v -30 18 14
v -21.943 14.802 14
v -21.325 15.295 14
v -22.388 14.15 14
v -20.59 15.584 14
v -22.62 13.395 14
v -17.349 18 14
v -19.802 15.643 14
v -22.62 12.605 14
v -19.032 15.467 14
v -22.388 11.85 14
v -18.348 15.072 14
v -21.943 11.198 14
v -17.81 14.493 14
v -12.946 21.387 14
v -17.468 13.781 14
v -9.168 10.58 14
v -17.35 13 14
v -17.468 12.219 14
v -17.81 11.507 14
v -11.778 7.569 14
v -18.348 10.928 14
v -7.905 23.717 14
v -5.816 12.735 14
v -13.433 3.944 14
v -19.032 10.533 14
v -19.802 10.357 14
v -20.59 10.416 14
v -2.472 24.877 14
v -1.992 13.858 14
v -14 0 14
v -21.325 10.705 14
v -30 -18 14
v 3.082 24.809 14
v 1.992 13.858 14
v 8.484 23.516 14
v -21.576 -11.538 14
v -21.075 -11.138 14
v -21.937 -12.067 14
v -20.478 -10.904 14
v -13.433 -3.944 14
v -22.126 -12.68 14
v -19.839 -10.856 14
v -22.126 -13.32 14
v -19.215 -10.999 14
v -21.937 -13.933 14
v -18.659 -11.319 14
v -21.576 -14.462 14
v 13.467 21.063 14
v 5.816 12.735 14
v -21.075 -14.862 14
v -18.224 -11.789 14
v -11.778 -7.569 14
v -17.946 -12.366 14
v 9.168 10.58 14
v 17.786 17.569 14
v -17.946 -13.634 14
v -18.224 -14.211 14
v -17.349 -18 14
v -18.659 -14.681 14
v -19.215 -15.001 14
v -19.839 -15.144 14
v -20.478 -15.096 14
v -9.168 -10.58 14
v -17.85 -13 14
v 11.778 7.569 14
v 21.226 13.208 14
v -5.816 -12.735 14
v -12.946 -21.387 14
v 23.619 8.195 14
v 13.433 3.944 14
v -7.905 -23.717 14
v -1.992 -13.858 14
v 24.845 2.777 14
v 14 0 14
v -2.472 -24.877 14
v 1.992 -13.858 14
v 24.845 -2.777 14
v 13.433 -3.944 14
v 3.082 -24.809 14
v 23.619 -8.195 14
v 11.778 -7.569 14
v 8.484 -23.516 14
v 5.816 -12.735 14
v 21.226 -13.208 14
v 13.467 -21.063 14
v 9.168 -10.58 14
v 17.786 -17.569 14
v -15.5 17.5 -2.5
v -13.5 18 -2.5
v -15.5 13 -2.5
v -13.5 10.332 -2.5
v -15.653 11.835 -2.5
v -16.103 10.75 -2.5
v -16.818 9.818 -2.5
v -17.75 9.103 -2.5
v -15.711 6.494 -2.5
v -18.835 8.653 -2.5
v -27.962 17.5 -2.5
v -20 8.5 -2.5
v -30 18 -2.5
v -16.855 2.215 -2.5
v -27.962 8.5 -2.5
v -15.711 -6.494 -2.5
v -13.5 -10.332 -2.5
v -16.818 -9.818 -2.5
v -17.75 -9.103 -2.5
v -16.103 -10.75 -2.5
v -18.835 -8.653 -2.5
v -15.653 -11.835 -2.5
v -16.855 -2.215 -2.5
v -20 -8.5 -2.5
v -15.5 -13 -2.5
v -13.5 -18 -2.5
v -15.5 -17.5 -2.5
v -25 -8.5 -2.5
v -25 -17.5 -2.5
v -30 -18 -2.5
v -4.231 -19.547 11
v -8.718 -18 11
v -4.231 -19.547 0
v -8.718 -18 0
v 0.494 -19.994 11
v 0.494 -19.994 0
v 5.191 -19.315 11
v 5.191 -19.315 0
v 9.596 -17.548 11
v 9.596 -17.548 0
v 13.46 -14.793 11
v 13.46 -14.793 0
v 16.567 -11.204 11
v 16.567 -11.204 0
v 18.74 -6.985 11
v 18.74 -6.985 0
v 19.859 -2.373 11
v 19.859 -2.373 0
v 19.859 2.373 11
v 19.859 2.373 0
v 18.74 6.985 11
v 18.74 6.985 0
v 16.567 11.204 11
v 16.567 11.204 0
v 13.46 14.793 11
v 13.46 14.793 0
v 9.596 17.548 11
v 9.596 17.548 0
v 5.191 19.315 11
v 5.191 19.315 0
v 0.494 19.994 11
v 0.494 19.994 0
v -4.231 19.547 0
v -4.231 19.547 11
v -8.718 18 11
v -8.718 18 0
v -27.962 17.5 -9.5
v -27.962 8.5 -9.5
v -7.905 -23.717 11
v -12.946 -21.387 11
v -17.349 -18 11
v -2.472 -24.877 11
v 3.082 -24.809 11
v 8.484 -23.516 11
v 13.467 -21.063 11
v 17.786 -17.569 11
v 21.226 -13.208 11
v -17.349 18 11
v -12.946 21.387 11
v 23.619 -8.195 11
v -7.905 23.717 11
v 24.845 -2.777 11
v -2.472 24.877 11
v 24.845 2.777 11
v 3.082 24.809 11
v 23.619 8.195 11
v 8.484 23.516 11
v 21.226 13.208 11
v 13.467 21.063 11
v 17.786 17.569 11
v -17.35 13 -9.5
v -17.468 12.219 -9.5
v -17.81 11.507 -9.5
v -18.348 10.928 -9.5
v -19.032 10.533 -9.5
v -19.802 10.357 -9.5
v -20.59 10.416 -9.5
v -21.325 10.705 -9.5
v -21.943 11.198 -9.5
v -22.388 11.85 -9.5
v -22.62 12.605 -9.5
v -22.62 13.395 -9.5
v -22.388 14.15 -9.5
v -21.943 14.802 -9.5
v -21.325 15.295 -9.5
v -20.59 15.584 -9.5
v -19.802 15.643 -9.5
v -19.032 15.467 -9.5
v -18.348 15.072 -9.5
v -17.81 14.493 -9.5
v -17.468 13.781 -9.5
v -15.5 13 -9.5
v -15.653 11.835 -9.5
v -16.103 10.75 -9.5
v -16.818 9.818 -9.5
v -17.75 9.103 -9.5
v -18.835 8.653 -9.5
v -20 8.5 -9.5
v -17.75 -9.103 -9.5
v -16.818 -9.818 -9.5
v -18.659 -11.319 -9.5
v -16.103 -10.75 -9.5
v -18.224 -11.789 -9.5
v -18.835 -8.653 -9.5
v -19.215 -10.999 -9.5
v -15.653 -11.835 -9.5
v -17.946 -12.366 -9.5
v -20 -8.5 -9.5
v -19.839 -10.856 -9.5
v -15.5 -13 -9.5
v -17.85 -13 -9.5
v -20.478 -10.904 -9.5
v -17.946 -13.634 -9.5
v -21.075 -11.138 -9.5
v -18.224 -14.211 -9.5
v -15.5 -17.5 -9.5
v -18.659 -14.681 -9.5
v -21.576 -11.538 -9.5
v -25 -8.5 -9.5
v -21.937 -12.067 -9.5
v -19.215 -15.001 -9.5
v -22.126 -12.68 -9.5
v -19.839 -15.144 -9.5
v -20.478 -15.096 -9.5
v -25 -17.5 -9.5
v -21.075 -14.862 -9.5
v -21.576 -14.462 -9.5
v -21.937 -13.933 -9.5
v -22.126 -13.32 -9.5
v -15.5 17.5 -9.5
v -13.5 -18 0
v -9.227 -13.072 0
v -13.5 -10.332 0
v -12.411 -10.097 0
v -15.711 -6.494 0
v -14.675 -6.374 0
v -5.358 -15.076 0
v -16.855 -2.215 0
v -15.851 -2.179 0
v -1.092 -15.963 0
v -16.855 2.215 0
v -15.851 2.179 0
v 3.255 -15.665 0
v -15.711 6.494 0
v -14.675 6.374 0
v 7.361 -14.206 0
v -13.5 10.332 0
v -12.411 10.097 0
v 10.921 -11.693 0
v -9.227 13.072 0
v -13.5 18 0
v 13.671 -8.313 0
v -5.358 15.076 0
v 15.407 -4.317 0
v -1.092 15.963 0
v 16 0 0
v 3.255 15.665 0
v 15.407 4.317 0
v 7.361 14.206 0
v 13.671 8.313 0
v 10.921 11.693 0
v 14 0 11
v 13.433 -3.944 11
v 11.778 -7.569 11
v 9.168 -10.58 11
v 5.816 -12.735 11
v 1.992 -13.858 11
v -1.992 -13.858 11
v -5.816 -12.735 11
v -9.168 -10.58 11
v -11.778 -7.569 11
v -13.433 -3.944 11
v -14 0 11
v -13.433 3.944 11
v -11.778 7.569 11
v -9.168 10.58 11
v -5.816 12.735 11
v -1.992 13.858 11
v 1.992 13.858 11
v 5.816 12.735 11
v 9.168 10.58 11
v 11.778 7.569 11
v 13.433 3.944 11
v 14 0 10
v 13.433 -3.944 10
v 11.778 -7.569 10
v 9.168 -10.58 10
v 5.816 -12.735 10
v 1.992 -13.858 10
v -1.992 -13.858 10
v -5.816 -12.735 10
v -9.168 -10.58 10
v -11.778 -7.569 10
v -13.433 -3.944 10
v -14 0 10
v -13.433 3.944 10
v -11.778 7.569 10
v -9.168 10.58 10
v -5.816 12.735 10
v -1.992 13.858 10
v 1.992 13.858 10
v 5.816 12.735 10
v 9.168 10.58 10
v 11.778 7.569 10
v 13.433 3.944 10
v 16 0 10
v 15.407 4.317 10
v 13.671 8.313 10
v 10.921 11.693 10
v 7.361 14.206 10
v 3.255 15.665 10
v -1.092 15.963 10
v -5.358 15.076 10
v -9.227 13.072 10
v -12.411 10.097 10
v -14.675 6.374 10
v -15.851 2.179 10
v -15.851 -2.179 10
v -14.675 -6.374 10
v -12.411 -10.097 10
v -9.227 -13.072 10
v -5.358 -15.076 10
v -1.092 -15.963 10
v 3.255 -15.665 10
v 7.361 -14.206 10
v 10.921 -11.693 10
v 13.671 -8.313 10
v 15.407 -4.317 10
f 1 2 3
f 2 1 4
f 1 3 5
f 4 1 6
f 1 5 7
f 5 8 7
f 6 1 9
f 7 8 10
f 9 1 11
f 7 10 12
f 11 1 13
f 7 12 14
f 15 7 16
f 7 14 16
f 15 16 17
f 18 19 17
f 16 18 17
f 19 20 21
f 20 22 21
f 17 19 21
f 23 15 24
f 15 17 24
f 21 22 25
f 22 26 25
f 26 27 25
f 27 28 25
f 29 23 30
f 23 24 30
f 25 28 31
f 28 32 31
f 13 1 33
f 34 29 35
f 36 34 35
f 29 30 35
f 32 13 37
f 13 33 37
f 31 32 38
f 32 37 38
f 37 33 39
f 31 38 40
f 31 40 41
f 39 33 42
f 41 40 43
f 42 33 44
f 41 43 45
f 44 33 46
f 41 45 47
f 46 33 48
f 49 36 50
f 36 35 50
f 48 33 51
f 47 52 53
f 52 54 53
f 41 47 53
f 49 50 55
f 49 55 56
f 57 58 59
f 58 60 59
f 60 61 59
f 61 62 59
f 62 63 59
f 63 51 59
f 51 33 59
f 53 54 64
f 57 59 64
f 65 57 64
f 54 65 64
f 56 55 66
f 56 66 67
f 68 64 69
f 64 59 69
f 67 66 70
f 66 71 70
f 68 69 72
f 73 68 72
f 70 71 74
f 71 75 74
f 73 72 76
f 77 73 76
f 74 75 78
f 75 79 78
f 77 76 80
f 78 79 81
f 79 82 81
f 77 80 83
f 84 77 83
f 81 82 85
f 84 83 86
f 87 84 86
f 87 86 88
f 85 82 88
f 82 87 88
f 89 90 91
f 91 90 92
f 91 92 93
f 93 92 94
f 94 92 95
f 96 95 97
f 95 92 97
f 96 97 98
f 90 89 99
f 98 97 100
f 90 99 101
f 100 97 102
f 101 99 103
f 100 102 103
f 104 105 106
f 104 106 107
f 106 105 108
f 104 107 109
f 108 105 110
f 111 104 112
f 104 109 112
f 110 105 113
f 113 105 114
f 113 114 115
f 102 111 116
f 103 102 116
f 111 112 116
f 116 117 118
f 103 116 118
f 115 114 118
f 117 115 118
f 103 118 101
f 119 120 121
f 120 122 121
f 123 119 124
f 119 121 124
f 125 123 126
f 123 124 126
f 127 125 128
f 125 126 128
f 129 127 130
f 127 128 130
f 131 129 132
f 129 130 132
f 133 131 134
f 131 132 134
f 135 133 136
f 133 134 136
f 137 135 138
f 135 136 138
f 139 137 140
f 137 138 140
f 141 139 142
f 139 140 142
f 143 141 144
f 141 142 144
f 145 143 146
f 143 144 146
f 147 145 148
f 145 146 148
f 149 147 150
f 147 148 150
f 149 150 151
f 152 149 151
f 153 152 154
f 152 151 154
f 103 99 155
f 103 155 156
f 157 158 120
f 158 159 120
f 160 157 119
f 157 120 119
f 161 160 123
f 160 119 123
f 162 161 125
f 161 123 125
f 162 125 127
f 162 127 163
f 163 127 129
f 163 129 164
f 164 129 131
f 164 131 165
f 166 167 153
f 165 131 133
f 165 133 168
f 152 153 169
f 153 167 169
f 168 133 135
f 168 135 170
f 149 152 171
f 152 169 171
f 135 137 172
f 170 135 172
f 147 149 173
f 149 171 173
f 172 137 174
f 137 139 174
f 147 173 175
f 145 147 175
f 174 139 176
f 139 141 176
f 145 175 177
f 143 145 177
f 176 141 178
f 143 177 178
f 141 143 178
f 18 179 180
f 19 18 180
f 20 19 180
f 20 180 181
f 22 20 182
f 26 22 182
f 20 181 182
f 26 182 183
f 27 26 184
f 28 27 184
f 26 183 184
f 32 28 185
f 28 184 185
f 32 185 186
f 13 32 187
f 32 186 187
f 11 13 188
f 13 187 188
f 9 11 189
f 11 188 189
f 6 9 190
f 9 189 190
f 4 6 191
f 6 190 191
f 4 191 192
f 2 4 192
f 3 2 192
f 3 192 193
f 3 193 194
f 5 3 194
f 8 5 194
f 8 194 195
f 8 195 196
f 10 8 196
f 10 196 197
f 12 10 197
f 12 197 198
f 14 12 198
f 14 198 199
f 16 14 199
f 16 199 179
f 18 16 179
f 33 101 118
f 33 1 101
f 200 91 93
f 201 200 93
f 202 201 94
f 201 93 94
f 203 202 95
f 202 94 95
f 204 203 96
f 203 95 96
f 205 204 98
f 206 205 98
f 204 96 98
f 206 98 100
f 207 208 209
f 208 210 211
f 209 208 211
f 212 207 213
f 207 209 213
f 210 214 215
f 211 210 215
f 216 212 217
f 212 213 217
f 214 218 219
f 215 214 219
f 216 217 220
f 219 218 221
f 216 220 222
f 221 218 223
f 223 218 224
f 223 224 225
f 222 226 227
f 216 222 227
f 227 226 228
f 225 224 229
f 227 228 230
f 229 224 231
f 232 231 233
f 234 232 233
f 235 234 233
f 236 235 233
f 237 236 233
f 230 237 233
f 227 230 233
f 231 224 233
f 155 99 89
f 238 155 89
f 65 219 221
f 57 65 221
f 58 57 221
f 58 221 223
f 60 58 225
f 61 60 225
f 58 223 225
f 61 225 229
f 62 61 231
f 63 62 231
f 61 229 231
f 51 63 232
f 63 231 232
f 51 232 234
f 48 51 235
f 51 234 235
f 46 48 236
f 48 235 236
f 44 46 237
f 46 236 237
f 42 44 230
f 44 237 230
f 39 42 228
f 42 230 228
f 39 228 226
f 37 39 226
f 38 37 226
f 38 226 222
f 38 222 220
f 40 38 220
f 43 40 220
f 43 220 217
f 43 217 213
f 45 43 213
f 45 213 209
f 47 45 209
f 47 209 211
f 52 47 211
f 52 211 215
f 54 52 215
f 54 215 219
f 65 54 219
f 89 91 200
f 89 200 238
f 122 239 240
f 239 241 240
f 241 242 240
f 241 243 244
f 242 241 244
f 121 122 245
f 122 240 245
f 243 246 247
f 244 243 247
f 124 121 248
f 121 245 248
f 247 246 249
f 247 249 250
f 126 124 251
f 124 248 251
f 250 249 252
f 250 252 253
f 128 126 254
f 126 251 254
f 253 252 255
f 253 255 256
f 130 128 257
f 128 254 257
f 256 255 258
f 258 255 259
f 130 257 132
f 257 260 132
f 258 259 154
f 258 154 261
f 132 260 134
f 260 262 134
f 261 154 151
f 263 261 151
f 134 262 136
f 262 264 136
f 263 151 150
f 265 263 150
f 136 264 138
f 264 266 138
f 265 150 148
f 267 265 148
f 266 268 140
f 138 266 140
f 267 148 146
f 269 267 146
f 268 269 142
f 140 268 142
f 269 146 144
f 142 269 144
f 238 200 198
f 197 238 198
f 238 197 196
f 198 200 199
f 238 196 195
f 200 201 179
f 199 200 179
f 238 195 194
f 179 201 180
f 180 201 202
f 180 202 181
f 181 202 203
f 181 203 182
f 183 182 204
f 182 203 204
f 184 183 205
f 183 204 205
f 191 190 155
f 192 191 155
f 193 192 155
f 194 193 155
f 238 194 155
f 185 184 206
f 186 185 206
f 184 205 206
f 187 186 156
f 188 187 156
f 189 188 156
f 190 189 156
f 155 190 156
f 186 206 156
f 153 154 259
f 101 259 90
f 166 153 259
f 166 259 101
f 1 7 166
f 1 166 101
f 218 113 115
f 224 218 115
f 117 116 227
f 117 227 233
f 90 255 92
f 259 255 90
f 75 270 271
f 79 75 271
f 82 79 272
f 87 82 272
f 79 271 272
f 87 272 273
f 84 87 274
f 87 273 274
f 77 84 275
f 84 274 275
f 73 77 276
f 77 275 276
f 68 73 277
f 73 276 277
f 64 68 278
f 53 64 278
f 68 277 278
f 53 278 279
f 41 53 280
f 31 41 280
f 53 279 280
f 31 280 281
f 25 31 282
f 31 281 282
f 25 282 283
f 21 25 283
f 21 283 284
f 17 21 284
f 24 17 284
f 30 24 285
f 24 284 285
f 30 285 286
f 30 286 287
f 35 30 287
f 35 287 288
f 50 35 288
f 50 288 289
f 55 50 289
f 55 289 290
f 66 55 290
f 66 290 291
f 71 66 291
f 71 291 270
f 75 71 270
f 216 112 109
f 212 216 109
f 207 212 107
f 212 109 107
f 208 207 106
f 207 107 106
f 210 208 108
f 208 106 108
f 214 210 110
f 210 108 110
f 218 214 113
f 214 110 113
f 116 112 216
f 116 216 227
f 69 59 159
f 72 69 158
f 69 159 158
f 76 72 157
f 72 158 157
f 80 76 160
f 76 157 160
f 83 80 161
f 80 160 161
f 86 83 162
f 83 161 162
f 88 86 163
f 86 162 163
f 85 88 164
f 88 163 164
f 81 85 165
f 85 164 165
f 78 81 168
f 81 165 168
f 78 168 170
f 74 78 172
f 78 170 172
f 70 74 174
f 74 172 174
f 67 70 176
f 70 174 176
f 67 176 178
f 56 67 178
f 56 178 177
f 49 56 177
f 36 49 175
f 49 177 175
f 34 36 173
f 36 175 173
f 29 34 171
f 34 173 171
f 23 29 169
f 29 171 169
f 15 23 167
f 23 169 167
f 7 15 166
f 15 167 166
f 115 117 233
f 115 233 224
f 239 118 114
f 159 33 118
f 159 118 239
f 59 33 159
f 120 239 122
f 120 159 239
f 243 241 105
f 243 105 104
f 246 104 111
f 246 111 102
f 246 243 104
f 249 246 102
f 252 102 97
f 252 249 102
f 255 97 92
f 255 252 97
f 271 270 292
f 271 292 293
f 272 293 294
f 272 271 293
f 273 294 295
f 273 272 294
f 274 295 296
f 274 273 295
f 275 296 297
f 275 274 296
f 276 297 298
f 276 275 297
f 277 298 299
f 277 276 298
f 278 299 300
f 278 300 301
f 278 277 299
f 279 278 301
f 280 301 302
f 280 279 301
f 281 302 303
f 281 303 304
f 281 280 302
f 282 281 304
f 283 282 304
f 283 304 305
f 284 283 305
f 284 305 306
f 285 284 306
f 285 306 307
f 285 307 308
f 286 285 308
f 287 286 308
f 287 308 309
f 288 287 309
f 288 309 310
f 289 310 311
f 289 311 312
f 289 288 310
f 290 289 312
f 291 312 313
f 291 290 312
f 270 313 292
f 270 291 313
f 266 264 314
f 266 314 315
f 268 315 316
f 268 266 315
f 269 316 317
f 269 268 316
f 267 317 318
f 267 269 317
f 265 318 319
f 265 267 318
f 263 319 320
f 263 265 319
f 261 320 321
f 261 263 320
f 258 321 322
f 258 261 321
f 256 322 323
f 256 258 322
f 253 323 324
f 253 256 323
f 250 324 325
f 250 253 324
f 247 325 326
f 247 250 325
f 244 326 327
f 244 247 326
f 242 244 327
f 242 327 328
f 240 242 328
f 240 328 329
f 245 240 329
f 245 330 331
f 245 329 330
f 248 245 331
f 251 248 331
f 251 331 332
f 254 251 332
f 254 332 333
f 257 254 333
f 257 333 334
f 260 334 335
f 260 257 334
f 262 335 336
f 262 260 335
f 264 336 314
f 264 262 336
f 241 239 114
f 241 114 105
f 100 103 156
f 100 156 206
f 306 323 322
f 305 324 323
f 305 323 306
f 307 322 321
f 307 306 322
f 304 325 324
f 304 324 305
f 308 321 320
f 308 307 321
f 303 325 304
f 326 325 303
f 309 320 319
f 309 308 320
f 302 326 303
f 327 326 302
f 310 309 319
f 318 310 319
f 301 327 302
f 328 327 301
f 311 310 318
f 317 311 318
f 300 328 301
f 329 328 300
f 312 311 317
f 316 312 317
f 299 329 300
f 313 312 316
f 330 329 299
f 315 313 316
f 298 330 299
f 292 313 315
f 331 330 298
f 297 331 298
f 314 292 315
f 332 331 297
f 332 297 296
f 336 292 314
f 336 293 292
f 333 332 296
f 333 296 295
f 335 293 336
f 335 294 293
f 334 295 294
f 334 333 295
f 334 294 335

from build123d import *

# Parameters (mm, degrees)
SKETCH_R        = 20
SKETCH_R_2      = 16
PAD_DEPTH       = 11
SKETCH001_R     = 25
PAD001_DEPTH    = 3
SKETCH002_R     = 16
SKETCH002_R_2   = 14
PAD002_DEPTH    = 1
SKETCH003_R     = 14
POCKET_DEPTH    = 3.001
SKETCH004_R     = 16
PAD003_DEPTH    = 14
PAD004_DEPTH    = 2.5
PAD005_DEPTH    = 7
SKETCH007_R     = 2.15
SKETCH007_R_2   = 2.65
POCKET001_DEPTH = 23.501


with BuildPart() as part:
    # Sketch → Pad (new body)
    with BuildSketch(Plane.XY):
        Circle(SKETCH_R)
        Circle(SKETCH_R_2, mode=Mode.SUBTRACT)
    extrude(amount=PAD_DEPTH)

    # Sketch001 (on Face4 of Pad) → Pad001 (join)
    with BuildSketch(Plane.XY.offset(11)):
        Circle(SKETCH001_R)
    extrude(amount=PAD001_DEPTH)

    # Sketch002 (on Face7 of Pad001) → Pad002 (join)
    with BuildSketch(Plane(origin=(0, 0, 11), x_dir=(1, 0, 0), z_dir=(0, 0, -1))):
        Circle(SKETCH002_R)
        Circle(SKETCH002_R_2, mode=Mode.SUBTRACT)
    extrude(amount=PAD002_DEPTH)

    # Sketch003 (on Face9 of Pad002) → Pocket (cut, through all)
    with BuildSketch(Plane(origin=(0, 0, 11), x_dir=(1, 0, 0), z_dir=(0, 0, -1))):
        Circle(SKETCH003_R)
    extrude(amount=-POCKET_DEPTH, mode=Mode.SUBTRACT)

    # Sketch004 (on Face6 of Pocket) → Pad003 (join)
    with BuildSketch(Plane(origin=(0, 0, 0), x_dir=(1, 0, 0), z_dir=(0, 0, -1))):
        with BuildLine():
            ThreePointArc((-8.717798, -18), (20, 0), (-8.717798, 18))
            Line((-30, 18), (-8.717798, 18))
            Line((-30, -18), (-30, 18))
            Line((-8.717798, -18), (-30, -18))
        make_face()
        Circle(SKETCH004_R, mode=Mode.SUBTRACT)
    extrude(amount=-PAD003_DEPTH)

    # Sketch005 (on Face9 of Pad003) → Pad004 (join)
    with BuildSketch(Plane(origin=(0, 0, 0), x_dir=(1, 0, 0), z_dir=(0, 0, -1))):
        with BuildLine():
            Line((-30, 18), (-13.5, 18))
            Line((-13.5, 18), (-13.5, 10.331989))
            ThreePointArc((-13.5, 10.331989), (-17, 0), (-13.5, -10.331989))
            Line((-13.5, -10.331989), (-13.5, -18))
            Line((-13.5, -18), (-30, -18))
            Line((-30, -18), (-30, 18))
        make_face()
    extrude(amount=PAD004_DEPTH)

    # Sketch006 (on Face19 of Pad004) → Pad005 (join)
    with BuildSketch(Plane(origin=(0, 0, -2.5), x_dir=(1, 0, 0), z_dir=(0, 0, -1))):
        with BuildLine():
            Line((-27.962286, -8.5), (-20.00003, -8.5))
            ThreePointArc((-15.5, -13), (-16.81803, -9.818009), (-20.00003, -8.5))
            Line((-15.5, -13), (-15.5, -17.5))
            Line((-27.962286, -17.5), (-15.5, -17.5))
            Line((-27.962286, -17.5), (-27.962286, -8.5))
        make_face()
        with BuildLine():
            Line((-25, 17.5), (-20, 17.5))
            Line((-20, 17.5), (-15.5, 17.5))
            Line((-15.5, 13), (-15.5, 17.5))
            ThreePointArc((-20, 8.5), (-16.818019, 9.818019), (-15.5, 13))
            Line((-20, 8.5), (-25, 8.5))
            Line((-25, 8.5), (-25, 17.5))
        make_face()
    extrude(amount=PAD005_DEPTH)

    # Sketch007 → Pocket001 (cut, through all)
    with BuildSketch(Plane(origin=(0, 0, -9.5), x_dir=(1, 0, 0), z_dir=(0, 0, -1))):
        with Locations((-20, 13)):
            Circle(SKETCH007_R)
        with Locations((-20, -13)):
            Circle(SKETCH007_R_2)
    extrude(amount=-POCKET001_DEPTH, mode=Mode.SUBTRACT)


solid = part.part
